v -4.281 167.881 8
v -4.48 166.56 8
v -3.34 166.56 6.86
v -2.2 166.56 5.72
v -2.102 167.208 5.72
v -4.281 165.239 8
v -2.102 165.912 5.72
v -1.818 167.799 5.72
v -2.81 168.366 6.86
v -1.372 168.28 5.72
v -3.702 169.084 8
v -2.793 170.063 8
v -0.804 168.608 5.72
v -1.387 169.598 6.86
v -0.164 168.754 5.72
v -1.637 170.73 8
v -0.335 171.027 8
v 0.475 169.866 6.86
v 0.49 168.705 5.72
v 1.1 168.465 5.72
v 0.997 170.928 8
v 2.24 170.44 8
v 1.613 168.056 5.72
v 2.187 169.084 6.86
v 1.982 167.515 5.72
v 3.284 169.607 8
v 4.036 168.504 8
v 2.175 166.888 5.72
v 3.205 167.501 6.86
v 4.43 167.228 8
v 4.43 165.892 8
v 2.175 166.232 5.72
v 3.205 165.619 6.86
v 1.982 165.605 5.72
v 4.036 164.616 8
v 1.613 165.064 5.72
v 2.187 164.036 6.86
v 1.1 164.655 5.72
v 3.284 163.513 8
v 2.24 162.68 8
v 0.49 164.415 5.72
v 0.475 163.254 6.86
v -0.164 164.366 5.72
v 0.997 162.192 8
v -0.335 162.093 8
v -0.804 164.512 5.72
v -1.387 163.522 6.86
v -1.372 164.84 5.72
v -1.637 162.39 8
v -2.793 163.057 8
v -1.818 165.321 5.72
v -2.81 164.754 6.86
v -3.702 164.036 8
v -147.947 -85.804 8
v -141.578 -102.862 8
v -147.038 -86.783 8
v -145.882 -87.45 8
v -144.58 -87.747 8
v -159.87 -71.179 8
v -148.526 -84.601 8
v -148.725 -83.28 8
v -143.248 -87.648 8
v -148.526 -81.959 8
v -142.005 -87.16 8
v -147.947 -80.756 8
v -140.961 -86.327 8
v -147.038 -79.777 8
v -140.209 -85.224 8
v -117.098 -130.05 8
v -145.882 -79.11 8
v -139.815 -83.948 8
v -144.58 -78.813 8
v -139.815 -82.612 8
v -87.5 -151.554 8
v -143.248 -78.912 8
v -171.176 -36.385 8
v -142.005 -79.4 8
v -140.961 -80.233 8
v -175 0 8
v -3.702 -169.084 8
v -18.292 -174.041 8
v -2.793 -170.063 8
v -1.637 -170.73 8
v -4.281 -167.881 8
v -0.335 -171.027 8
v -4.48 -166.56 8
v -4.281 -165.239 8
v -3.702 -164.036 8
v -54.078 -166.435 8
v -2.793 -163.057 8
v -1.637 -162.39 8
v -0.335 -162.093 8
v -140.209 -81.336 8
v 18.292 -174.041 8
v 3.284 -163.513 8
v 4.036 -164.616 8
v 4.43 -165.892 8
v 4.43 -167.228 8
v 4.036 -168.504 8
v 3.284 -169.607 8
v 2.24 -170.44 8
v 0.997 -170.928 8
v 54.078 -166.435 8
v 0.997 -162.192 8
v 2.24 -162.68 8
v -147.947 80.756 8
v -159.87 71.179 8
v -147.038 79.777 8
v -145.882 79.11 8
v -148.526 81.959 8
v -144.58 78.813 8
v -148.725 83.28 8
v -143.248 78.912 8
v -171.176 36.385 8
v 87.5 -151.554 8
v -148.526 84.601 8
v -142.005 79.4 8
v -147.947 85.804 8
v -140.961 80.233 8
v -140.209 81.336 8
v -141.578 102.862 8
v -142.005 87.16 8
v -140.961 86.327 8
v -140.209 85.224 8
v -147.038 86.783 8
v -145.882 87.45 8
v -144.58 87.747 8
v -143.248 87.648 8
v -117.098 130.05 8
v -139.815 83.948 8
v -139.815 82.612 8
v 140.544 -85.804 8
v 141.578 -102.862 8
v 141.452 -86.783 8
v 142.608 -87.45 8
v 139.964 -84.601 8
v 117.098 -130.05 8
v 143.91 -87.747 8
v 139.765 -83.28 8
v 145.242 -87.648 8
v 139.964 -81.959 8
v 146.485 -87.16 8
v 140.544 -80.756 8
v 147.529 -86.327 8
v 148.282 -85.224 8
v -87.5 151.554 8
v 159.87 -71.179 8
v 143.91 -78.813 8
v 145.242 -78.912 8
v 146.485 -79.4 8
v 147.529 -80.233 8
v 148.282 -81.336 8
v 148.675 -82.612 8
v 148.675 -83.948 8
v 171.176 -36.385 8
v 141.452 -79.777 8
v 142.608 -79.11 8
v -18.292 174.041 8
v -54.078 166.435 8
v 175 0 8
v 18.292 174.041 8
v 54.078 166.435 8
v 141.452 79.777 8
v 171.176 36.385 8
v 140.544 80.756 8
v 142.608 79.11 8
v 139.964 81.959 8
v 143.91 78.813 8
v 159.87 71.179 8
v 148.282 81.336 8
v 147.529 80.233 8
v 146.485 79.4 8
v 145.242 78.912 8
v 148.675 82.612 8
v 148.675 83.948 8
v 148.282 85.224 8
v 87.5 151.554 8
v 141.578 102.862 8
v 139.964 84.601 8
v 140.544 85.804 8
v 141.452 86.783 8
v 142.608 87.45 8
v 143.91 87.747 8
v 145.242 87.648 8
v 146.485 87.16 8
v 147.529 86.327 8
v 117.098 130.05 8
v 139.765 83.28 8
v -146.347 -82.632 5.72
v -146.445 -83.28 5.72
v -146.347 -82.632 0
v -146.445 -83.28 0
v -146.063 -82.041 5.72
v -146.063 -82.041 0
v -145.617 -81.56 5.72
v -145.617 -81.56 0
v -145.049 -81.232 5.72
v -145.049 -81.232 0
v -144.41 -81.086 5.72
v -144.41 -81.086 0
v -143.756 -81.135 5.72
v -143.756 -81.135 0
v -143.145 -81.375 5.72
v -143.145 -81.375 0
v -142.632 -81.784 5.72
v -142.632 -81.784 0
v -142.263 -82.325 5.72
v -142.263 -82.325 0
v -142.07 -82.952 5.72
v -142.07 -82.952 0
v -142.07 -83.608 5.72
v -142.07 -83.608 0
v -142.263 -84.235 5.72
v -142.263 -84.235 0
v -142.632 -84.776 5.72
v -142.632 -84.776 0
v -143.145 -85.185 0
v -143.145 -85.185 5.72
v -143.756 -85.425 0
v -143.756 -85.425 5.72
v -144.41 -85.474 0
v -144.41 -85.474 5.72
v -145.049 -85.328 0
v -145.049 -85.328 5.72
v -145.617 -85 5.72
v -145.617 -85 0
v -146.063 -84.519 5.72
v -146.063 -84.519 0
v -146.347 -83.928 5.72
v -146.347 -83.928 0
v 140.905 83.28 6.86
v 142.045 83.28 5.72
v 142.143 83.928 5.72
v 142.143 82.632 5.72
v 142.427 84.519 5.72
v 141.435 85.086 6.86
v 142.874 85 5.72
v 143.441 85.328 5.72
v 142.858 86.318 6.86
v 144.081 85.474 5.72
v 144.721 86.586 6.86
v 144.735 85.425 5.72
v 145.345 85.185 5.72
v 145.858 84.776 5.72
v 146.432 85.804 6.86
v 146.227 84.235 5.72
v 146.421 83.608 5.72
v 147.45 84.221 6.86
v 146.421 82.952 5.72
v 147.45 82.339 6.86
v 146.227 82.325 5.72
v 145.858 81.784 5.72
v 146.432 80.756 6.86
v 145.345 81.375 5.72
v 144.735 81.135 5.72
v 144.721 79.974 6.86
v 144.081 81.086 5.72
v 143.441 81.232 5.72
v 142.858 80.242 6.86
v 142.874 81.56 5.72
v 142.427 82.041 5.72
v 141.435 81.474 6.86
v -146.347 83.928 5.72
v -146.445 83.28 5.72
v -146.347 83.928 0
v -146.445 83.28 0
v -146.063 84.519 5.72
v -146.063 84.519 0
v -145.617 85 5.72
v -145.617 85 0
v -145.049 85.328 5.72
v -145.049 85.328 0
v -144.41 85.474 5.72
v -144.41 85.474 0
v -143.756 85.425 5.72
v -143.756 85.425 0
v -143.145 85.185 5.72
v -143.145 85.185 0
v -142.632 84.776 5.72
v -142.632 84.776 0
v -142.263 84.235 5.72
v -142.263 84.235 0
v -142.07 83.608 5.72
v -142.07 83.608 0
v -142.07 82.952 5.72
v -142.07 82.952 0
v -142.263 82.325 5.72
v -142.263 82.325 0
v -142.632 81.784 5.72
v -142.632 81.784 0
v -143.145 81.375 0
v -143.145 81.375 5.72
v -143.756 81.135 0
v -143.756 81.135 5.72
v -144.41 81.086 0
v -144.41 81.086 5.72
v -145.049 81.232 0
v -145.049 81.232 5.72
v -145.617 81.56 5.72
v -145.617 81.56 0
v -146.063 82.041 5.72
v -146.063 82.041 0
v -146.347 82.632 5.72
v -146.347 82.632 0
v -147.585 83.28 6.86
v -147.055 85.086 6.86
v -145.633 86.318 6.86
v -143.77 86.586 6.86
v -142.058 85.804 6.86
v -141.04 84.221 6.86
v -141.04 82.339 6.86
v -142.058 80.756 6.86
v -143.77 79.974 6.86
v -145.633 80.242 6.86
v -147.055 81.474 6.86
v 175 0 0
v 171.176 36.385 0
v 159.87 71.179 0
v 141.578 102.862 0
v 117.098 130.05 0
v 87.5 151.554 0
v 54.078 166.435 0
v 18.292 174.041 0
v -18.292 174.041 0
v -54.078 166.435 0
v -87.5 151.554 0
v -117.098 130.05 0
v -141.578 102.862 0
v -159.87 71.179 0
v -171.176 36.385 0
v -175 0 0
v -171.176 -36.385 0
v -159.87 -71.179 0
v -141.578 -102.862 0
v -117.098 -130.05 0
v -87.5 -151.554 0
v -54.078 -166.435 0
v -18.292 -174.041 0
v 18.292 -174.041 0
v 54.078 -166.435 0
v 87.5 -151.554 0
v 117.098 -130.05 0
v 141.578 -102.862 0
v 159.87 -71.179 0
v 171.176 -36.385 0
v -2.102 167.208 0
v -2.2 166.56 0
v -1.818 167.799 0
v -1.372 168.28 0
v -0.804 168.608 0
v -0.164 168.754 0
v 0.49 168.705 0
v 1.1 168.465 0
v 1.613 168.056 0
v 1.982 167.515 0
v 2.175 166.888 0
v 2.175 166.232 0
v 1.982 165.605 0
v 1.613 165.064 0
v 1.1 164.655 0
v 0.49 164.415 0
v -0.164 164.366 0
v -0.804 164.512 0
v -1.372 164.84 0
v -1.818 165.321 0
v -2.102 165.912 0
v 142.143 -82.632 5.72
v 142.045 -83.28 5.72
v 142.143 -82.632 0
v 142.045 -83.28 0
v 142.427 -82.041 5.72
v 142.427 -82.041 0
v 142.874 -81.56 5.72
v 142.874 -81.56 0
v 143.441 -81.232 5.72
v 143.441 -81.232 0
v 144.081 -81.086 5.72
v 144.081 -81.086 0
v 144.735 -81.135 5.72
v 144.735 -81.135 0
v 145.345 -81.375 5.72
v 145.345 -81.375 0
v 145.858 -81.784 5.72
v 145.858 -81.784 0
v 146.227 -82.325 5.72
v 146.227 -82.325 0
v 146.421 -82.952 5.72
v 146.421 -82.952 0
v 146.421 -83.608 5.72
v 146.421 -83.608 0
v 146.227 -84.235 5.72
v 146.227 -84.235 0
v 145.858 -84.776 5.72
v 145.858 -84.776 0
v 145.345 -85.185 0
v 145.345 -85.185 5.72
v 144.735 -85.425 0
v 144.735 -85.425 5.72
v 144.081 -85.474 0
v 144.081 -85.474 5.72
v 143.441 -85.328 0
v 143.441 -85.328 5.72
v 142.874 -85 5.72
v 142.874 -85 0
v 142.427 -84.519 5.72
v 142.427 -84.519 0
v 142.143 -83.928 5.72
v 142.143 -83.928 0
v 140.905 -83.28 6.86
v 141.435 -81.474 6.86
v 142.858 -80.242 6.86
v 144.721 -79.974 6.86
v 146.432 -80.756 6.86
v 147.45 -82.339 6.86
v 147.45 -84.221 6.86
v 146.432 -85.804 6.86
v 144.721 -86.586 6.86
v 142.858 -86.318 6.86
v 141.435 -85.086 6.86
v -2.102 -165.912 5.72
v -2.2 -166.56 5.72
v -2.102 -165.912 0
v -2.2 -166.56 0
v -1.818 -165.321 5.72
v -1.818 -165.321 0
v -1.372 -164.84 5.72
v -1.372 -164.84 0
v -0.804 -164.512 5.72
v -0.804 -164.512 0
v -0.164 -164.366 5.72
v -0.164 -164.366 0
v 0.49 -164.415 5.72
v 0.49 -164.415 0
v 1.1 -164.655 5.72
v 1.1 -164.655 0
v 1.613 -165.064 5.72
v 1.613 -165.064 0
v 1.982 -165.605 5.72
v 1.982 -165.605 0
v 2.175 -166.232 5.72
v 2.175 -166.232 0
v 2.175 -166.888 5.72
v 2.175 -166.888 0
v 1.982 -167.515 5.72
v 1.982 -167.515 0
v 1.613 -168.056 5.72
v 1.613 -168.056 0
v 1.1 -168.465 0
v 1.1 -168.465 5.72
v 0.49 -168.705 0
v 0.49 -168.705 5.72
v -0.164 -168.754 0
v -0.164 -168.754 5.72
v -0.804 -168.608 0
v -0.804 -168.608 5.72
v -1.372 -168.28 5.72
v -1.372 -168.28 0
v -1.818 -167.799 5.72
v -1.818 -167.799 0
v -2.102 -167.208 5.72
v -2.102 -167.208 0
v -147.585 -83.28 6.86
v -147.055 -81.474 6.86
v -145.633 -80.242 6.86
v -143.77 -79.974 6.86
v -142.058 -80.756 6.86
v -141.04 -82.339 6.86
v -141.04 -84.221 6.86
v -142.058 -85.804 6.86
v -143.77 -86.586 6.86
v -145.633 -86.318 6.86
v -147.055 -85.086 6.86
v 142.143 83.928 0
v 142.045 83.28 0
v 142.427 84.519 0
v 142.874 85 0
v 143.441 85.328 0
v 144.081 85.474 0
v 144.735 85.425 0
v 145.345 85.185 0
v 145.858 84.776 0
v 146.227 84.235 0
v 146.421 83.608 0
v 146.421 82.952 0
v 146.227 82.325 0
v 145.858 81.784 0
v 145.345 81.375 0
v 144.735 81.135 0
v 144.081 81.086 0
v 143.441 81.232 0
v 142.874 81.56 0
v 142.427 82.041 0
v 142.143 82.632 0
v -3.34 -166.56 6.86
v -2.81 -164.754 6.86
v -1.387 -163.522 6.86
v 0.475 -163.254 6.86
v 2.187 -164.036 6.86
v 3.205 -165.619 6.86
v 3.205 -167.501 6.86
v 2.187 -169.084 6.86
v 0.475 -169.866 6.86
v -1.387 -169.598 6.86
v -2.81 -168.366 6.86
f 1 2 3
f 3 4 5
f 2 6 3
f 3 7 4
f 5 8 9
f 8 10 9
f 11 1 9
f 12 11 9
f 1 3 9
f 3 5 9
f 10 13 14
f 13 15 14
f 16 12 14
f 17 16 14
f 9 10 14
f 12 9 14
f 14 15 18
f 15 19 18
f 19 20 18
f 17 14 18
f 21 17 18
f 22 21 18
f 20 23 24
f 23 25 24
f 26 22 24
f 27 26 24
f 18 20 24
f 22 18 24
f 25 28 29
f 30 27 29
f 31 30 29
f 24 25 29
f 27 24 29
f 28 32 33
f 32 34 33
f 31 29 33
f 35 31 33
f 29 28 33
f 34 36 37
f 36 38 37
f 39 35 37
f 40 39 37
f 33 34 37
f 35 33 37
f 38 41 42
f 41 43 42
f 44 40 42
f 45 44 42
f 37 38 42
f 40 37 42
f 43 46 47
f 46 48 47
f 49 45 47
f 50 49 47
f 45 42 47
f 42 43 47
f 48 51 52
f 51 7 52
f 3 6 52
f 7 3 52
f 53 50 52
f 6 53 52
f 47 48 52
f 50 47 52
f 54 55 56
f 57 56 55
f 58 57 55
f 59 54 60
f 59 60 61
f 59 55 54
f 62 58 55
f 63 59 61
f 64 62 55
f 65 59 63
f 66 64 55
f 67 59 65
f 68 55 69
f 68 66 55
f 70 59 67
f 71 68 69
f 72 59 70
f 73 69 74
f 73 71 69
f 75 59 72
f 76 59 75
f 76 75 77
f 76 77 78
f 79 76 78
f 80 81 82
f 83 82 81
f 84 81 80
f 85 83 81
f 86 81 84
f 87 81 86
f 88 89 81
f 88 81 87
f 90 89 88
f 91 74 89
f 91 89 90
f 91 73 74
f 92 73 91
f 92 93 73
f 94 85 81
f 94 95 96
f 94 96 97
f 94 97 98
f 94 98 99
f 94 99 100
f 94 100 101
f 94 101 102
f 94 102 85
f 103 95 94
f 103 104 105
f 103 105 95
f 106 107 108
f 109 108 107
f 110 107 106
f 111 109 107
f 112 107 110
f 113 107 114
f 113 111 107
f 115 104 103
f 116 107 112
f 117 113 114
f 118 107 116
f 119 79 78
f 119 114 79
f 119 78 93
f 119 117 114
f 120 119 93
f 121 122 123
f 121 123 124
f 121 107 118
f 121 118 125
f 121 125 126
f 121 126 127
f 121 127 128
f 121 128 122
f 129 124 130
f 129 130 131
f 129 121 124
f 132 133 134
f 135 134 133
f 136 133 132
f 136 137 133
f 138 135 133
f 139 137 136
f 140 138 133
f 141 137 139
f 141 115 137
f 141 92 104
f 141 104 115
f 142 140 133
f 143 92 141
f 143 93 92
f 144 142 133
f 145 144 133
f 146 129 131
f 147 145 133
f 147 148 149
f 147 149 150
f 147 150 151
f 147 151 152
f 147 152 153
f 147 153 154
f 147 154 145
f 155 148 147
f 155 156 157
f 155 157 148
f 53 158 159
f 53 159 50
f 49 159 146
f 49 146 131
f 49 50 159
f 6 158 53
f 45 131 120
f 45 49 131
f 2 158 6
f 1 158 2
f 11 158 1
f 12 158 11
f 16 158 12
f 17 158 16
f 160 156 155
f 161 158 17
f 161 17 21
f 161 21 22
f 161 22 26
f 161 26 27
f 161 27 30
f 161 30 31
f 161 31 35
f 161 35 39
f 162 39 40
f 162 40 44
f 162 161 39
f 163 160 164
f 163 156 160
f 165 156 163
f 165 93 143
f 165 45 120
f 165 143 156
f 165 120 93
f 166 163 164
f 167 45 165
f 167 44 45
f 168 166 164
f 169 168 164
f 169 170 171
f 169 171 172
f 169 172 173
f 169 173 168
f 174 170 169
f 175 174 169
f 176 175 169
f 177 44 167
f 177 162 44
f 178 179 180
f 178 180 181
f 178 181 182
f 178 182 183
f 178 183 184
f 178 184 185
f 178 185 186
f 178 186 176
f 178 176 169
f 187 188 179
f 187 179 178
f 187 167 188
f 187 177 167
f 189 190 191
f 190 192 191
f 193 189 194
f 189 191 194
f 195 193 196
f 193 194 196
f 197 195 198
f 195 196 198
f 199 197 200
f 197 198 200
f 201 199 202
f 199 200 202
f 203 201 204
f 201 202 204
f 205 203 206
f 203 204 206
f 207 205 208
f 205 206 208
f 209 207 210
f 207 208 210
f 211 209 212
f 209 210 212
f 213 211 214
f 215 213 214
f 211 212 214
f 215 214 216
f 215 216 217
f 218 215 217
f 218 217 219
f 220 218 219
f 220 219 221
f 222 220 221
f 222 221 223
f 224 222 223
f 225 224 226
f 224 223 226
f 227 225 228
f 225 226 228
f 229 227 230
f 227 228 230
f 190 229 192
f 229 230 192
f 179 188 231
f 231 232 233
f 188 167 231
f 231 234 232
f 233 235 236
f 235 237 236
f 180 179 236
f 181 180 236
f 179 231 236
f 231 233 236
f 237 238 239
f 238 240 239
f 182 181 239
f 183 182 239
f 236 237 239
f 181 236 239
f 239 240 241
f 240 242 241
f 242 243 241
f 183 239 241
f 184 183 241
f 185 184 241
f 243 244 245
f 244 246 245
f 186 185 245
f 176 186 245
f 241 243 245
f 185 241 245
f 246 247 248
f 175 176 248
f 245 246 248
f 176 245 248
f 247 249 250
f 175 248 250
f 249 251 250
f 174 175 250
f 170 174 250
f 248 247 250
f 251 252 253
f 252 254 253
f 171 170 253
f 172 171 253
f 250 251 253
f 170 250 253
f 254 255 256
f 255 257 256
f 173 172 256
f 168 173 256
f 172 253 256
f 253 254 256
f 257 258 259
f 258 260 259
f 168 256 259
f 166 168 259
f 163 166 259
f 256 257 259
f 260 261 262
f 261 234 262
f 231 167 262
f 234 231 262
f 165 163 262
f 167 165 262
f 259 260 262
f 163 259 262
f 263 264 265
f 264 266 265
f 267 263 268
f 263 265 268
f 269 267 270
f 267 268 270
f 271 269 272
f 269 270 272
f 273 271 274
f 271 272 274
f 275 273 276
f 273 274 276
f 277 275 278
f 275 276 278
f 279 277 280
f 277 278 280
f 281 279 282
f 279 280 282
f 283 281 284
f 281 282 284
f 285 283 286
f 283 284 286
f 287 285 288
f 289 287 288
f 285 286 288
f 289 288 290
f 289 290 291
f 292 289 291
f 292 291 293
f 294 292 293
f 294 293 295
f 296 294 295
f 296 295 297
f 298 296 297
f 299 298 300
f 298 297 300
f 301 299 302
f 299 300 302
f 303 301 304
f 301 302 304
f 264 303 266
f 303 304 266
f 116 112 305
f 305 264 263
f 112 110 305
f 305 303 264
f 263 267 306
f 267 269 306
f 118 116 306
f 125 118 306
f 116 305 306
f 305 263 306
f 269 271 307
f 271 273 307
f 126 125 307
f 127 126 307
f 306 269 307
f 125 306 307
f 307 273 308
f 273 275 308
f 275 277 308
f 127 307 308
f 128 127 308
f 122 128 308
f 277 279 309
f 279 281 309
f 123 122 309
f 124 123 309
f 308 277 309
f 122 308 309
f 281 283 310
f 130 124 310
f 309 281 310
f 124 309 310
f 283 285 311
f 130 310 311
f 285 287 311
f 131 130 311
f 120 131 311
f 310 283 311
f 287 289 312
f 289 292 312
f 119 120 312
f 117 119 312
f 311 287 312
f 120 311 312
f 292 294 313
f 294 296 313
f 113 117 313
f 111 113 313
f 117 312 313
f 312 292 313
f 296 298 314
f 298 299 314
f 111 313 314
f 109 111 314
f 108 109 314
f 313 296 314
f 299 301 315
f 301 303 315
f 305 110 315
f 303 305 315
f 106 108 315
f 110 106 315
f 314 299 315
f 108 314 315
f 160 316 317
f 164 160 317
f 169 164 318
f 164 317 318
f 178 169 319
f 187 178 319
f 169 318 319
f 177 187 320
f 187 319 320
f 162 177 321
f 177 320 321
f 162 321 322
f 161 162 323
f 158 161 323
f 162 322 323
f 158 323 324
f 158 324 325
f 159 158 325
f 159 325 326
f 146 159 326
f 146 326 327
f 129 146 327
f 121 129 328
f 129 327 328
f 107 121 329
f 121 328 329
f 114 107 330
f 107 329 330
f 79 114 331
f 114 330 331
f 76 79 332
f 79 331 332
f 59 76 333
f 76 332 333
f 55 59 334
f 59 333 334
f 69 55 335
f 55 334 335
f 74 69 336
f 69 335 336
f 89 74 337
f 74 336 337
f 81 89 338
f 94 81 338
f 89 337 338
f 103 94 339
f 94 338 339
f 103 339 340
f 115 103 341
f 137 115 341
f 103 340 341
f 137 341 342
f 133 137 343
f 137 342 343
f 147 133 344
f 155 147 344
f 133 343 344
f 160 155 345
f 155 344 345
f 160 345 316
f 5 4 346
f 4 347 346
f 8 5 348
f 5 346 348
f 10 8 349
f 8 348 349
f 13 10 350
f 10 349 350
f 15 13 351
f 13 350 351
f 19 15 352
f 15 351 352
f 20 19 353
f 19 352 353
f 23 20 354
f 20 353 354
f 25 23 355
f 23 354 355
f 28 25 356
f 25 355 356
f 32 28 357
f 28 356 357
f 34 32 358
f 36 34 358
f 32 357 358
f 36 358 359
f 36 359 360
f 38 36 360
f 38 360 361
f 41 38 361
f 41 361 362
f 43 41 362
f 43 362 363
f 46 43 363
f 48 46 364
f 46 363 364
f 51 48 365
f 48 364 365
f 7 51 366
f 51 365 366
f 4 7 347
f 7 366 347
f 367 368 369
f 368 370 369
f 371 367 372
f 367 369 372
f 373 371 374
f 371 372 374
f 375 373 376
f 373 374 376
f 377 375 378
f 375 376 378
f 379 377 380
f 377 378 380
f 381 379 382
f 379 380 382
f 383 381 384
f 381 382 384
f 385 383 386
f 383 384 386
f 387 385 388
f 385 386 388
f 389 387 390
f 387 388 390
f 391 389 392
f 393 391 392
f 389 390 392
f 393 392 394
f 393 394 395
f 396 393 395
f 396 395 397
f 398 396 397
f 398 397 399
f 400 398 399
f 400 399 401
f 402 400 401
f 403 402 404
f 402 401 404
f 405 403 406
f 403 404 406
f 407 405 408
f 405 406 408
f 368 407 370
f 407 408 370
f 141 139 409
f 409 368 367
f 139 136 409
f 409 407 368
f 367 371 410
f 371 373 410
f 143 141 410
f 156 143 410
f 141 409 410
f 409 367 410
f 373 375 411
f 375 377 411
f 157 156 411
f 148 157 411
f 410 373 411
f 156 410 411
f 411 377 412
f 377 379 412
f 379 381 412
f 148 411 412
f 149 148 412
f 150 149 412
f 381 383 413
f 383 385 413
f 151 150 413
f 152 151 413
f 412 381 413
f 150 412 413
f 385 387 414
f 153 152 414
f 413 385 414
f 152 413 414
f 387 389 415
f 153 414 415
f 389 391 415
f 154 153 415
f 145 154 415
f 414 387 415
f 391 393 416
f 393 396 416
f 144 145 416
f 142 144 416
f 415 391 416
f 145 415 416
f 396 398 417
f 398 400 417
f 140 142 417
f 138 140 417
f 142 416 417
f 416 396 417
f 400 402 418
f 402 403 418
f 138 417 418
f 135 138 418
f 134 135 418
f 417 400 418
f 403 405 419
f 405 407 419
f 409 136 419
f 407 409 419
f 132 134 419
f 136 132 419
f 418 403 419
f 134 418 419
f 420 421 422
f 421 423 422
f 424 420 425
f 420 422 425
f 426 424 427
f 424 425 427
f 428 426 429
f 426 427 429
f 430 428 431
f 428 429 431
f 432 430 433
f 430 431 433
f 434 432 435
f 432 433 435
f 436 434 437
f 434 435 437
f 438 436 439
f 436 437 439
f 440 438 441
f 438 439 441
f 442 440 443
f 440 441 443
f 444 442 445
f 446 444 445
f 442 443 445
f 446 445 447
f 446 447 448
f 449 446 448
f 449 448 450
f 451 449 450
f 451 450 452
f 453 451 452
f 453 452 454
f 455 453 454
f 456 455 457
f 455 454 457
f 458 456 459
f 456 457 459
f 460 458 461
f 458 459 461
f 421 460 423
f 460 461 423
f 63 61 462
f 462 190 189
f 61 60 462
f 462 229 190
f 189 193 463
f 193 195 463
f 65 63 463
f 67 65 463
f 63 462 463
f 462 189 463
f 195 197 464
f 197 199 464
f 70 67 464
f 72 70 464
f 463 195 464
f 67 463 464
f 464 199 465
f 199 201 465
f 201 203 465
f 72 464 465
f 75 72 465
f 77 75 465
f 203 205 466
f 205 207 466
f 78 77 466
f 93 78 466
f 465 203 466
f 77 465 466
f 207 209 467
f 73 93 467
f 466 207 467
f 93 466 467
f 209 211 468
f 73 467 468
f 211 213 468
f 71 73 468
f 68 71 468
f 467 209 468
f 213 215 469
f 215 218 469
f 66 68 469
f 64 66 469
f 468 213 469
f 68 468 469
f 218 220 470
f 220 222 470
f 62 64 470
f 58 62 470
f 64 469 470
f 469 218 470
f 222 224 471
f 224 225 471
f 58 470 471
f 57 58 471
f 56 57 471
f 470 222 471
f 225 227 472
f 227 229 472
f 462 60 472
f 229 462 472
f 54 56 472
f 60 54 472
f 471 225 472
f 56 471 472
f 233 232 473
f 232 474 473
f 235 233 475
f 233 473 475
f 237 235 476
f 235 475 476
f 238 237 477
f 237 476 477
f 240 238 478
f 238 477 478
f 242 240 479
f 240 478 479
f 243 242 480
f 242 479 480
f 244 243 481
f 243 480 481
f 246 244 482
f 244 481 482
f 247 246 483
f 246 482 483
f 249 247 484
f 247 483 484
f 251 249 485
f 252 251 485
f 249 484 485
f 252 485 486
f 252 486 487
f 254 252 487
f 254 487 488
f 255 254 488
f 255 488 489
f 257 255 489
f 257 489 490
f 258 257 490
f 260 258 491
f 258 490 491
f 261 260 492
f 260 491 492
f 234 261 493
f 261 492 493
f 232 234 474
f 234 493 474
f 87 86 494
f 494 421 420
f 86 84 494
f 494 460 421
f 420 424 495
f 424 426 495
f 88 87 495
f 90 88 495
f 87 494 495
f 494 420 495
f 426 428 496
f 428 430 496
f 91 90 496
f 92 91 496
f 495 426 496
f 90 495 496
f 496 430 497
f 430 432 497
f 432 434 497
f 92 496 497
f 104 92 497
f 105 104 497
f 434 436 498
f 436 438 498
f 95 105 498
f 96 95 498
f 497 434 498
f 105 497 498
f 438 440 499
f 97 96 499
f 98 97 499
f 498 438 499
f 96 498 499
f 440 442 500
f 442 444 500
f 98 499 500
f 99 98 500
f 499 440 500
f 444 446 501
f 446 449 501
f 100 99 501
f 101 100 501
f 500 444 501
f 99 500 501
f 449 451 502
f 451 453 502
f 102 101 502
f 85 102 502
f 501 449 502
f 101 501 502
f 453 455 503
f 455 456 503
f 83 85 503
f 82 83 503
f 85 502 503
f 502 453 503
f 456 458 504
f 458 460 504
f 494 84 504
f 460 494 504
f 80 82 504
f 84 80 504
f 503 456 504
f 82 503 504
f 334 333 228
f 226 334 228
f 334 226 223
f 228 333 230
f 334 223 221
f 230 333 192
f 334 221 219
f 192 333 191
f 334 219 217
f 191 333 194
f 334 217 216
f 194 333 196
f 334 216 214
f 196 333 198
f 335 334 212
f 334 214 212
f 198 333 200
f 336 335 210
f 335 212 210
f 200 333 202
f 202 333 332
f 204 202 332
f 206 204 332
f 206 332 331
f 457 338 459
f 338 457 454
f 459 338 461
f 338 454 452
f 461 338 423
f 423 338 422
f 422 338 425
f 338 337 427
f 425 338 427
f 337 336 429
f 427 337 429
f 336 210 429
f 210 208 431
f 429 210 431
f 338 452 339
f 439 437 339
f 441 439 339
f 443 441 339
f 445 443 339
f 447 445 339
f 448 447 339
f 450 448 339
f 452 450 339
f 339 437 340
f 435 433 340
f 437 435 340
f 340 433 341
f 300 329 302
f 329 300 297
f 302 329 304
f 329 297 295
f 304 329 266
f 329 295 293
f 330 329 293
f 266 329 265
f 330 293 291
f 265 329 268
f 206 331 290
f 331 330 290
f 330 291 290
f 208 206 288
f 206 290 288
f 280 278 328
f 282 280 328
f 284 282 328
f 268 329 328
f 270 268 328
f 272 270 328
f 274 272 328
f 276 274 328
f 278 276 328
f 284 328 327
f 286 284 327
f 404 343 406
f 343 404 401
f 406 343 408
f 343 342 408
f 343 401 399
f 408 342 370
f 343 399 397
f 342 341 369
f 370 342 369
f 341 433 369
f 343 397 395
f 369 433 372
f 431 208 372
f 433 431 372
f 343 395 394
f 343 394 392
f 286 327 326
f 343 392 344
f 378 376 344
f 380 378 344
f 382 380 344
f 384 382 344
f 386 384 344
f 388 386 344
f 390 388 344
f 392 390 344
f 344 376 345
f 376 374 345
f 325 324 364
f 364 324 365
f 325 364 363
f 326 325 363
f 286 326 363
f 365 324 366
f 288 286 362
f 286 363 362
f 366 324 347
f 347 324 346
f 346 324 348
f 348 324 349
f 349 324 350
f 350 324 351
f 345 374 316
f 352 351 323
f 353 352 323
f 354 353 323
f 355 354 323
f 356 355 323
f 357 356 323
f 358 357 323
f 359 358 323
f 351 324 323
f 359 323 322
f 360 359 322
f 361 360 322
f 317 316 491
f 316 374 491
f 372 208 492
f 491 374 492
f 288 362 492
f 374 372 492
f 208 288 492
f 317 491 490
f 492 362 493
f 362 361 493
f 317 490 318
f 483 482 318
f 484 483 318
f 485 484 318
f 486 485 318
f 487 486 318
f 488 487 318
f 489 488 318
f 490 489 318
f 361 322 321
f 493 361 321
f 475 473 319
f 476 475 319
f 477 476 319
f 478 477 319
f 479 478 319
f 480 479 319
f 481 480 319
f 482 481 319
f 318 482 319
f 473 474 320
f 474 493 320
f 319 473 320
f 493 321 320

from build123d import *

# Parameters (mm, degrees)
F0_R           = 175
F0_R_2         = 1.65
F1_DEPTH       = 8
F3_D           = 4.4
F3_CSINK_D     = 8.96
F3_CSINK_ANGLE = 90


with BuildPart() as f1:
    # F0 (on Top) → F1 (new body)
    with BuildSketch(Plane.XY):
        Circle(F0_R)
        with Locations((-144.2451912543, -83.28)):
            Circle(F0_R_2, mode=Mode.SUBTRACT)
        with Locations((0, -166.56)):
            Circle(F0_R_2, mode=Mode.SUBTRACT)
        with Locations((144.2451912543, -83.28)):
            Circle(F0_R_2, mode=Mode.SUBTRACT)
        with Locations((-144.2451912543, 83.28)):
            Circle(F0_R_2, mode=Mode.SUBTRACT)
        with Locations((144.2451912543, 83.28)):
            Circle(F0_R_2, mode=Mode.SUBTRACT)
        with Locations((0, 166.56)):
            Circle(F0_R_2, mode=Mode.SUBTRACT)
    extrude(amount=F1_DEPTH)

    # F3 (through all)
    with Locations(Plane.XY.offset(8)):
        with Locations((-144.2451912543, -83.28), (-144.2451912543, 83.28), (0, 166.56), (144.2451912543, 83.28), (144.2451912543, -83.28), (0, -166.56)):
            CounterSinkHole(F3_D / 2, F3_CSINK_D / 2, counter_sink_angle=F3_CSINK_ANGLE)


solid = f1.part
